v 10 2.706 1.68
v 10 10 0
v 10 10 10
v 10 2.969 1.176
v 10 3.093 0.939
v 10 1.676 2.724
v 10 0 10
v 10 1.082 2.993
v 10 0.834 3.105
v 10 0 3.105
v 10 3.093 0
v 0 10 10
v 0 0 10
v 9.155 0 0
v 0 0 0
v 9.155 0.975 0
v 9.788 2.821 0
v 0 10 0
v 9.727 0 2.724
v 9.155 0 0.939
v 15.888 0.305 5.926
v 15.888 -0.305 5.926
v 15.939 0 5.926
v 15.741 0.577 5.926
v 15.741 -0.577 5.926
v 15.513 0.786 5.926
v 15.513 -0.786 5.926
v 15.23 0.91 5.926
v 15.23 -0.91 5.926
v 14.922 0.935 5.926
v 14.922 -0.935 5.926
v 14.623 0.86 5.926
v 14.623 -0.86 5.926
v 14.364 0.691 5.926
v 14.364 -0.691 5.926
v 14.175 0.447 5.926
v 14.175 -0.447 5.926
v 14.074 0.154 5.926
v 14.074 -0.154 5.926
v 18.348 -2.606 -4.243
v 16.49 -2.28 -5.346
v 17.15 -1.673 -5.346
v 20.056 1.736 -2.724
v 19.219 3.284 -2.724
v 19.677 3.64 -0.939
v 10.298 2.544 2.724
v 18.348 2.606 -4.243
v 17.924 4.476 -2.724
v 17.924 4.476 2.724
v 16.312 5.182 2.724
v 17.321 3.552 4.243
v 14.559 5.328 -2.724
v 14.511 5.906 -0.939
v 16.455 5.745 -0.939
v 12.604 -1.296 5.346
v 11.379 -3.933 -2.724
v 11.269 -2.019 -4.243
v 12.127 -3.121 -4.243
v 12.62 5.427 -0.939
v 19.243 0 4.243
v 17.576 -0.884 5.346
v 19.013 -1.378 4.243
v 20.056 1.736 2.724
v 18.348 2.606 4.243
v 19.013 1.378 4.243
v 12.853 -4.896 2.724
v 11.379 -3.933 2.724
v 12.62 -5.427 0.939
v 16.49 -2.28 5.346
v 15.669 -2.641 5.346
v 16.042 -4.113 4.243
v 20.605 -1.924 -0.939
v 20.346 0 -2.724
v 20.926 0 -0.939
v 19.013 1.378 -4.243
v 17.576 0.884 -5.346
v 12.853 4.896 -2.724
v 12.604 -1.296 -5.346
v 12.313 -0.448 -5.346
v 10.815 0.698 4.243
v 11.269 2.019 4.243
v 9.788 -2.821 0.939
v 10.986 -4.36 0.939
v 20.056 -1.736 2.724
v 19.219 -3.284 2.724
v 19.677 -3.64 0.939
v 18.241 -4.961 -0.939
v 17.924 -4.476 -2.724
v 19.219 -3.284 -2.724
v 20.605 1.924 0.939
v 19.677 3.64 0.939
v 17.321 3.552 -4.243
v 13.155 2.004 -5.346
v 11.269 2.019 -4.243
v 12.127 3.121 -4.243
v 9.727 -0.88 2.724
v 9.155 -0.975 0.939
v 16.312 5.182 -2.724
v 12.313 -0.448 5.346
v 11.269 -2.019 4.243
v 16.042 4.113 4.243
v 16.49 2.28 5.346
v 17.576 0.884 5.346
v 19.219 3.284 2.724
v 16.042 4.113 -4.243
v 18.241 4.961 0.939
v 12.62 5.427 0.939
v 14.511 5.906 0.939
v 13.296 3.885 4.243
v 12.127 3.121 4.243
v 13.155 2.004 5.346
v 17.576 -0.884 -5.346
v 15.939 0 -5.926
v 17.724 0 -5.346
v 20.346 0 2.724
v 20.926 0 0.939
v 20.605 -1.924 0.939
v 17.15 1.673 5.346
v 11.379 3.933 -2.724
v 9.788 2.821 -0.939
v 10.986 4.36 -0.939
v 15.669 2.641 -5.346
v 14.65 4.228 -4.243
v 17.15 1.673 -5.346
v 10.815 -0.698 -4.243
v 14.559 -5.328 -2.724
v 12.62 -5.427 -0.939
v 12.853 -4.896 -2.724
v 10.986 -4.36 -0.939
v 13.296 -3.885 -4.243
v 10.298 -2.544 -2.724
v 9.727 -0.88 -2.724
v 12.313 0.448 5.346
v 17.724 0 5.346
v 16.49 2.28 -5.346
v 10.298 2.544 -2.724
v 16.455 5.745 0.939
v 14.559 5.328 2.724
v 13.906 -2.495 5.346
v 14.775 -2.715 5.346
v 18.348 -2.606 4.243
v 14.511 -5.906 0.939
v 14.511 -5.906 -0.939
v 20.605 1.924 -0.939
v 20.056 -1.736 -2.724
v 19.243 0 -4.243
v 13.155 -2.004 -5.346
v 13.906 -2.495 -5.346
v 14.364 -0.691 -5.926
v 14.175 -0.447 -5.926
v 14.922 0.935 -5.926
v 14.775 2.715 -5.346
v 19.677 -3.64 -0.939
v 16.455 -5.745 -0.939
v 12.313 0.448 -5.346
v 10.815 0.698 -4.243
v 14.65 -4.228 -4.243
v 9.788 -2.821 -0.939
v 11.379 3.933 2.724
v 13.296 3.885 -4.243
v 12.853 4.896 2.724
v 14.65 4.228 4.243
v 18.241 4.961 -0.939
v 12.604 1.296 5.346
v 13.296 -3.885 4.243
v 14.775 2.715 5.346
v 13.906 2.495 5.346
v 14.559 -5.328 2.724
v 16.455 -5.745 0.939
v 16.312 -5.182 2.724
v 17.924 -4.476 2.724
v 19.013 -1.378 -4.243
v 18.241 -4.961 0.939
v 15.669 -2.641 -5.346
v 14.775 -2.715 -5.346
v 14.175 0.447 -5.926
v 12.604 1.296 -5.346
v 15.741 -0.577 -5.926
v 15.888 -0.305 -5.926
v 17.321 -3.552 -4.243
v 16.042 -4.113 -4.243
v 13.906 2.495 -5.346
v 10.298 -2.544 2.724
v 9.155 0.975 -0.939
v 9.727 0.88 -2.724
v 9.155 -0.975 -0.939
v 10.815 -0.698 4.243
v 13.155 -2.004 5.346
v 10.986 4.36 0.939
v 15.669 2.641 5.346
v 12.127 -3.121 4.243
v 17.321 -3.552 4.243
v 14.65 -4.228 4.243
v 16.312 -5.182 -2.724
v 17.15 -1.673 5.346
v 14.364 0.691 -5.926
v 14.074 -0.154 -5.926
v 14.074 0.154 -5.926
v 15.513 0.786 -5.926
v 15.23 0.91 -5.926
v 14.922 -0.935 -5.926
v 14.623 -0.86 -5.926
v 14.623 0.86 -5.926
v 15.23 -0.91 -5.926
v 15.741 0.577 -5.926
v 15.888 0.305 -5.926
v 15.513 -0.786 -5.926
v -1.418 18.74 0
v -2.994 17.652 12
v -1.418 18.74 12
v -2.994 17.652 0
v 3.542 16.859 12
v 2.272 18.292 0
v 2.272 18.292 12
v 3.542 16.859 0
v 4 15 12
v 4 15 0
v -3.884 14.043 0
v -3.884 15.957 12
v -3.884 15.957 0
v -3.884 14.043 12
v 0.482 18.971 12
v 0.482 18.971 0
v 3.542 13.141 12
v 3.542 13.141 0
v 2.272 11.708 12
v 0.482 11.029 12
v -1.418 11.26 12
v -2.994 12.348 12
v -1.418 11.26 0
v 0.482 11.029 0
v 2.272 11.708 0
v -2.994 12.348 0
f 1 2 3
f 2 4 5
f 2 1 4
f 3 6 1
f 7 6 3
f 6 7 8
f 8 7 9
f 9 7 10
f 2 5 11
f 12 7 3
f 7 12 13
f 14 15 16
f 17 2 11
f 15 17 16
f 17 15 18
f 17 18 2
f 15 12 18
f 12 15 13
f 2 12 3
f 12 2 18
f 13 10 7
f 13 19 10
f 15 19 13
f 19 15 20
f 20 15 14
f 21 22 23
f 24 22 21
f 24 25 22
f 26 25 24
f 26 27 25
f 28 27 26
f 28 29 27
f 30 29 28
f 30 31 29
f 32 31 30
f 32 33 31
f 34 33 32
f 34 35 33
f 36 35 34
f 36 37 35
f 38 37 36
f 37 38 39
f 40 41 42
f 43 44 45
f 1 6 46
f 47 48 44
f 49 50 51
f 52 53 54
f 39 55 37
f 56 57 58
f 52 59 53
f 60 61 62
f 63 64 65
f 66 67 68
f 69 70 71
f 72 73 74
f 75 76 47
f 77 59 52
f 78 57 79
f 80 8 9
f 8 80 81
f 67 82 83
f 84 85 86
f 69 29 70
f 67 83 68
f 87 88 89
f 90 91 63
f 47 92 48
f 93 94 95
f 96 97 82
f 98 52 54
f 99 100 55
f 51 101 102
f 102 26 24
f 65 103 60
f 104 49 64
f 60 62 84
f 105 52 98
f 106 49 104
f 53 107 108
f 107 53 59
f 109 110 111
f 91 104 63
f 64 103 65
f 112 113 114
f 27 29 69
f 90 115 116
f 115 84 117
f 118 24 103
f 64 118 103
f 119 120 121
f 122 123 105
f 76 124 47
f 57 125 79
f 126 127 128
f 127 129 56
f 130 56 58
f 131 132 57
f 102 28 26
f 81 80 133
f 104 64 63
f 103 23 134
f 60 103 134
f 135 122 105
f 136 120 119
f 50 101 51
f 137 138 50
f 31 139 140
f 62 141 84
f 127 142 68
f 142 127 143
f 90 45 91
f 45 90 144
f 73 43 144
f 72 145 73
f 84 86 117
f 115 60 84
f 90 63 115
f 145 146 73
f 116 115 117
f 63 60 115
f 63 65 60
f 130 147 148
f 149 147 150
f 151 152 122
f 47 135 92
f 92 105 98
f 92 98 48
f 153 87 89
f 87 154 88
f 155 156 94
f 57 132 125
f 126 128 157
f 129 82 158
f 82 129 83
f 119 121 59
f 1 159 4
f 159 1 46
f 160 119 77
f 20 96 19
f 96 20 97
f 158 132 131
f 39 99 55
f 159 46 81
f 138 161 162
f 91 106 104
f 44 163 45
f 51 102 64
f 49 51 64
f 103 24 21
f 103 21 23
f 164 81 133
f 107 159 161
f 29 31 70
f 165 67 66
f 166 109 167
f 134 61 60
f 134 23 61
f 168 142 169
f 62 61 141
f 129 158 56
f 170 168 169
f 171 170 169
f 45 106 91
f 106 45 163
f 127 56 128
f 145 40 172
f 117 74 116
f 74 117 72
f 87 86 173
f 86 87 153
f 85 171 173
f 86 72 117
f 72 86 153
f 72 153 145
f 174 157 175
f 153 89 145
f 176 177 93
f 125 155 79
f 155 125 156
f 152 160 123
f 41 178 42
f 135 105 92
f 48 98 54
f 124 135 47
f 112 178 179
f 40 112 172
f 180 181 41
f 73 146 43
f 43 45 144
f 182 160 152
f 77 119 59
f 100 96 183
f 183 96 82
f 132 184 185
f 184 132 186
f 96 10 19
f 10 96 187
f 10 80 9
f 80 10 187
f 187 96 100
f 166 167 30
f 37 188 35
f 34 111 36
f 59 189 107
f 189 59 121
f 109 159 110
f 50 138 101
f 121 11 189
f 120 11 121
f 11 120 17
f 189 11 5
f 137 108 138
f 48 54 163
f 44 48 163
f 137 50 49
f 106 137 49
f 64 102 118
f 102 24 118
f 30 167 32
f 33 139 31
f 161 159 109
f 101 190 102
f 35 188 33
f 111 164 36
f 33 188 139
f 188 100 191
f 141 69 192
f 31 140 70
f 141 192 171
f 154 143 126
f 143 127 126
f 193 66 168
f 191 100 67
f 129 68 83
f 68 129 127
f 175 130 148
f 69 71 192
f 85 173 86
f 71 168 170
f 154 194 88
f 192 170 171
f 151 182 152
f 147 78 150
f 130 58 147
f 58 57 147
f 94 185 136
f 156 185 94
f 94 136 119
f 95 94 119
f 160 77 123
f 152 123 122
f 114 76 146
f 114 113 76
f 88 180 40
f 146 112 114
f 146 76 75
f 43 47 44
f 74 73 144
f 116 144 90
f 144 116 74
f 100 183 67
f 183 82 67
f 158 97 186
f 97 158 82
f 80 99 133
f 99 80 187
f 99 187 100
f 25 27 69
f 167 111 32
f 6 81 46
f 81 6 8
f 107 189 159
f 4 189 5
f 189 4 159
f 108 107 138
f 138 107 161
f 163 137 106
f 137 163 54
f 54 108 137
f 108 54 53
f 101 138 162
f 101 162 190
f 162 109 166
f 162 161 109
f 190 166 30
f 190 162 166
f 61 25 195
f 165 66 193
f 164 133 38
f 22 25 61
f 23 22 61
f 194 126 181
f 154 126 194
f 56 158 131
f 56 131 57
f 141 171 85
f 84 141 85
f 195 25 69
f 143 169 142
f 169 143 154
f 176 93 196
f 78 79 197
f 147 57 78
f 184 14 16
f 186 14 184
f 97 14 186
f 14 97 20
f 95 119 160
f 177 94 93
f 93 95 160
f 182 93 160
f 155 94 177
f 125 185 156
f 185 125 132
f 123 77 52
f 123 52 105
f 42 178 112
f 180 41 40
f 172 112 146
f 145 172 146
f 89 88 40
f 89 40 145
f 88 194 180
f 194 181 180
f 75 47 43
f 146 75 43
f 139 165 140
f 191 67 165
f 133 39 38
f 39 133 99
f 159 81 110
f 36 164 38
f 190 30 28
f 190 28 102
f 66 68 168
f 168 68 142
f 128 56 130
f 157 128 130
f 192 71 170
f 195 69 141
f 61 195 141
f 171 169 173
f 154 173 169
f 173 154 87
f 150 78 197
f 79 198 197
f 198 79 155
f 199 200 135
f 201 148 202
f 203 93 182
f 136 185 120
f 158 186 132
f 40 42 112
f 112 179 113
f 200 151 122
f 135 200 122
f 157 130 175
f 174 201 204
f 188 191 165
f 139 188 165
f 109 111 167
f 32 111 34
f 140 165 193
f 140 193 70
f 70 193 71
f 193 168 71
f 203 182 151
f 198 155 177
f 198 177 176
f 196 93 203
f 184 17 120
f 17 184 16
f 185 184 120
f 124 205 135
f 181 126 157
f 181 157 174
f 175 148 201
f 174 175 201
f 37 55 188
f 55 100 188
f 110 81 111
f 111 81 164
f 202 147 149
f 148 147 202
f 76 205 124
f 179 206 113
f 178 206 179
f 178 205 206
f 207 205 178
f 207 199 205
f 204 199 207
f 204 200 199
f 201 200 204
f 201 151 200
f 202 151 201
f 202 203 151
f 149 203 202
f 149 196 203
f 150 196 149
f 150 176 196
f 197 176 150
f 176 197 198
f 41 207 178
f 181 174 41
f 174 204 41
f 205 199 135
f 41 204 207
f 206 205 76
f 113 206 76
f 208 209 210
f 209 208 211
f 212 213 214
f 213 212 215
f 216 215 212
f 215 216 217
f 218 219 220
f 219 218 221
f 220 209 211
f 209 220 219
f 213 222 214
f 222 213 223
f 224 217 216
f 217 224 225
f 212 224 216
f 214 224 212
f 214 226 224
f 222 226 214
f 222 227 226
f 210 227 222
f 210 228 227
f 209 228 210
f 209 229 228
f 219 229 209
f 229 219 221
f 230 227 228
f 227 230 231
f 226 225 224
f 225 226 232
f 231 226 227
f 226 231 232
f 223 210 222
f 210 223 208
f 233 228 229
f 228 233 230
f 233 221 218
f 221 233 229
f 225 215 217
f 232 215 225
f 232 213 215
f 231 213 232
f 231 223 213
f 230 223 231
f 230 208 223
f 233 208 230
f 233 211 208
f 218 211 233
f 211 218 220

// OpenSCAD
color("red") cube(10);
translate([15,0,0]) color("blue") sphere(6);
translate([0,15,0]) color("green") cylinder(h=12, r=4);
